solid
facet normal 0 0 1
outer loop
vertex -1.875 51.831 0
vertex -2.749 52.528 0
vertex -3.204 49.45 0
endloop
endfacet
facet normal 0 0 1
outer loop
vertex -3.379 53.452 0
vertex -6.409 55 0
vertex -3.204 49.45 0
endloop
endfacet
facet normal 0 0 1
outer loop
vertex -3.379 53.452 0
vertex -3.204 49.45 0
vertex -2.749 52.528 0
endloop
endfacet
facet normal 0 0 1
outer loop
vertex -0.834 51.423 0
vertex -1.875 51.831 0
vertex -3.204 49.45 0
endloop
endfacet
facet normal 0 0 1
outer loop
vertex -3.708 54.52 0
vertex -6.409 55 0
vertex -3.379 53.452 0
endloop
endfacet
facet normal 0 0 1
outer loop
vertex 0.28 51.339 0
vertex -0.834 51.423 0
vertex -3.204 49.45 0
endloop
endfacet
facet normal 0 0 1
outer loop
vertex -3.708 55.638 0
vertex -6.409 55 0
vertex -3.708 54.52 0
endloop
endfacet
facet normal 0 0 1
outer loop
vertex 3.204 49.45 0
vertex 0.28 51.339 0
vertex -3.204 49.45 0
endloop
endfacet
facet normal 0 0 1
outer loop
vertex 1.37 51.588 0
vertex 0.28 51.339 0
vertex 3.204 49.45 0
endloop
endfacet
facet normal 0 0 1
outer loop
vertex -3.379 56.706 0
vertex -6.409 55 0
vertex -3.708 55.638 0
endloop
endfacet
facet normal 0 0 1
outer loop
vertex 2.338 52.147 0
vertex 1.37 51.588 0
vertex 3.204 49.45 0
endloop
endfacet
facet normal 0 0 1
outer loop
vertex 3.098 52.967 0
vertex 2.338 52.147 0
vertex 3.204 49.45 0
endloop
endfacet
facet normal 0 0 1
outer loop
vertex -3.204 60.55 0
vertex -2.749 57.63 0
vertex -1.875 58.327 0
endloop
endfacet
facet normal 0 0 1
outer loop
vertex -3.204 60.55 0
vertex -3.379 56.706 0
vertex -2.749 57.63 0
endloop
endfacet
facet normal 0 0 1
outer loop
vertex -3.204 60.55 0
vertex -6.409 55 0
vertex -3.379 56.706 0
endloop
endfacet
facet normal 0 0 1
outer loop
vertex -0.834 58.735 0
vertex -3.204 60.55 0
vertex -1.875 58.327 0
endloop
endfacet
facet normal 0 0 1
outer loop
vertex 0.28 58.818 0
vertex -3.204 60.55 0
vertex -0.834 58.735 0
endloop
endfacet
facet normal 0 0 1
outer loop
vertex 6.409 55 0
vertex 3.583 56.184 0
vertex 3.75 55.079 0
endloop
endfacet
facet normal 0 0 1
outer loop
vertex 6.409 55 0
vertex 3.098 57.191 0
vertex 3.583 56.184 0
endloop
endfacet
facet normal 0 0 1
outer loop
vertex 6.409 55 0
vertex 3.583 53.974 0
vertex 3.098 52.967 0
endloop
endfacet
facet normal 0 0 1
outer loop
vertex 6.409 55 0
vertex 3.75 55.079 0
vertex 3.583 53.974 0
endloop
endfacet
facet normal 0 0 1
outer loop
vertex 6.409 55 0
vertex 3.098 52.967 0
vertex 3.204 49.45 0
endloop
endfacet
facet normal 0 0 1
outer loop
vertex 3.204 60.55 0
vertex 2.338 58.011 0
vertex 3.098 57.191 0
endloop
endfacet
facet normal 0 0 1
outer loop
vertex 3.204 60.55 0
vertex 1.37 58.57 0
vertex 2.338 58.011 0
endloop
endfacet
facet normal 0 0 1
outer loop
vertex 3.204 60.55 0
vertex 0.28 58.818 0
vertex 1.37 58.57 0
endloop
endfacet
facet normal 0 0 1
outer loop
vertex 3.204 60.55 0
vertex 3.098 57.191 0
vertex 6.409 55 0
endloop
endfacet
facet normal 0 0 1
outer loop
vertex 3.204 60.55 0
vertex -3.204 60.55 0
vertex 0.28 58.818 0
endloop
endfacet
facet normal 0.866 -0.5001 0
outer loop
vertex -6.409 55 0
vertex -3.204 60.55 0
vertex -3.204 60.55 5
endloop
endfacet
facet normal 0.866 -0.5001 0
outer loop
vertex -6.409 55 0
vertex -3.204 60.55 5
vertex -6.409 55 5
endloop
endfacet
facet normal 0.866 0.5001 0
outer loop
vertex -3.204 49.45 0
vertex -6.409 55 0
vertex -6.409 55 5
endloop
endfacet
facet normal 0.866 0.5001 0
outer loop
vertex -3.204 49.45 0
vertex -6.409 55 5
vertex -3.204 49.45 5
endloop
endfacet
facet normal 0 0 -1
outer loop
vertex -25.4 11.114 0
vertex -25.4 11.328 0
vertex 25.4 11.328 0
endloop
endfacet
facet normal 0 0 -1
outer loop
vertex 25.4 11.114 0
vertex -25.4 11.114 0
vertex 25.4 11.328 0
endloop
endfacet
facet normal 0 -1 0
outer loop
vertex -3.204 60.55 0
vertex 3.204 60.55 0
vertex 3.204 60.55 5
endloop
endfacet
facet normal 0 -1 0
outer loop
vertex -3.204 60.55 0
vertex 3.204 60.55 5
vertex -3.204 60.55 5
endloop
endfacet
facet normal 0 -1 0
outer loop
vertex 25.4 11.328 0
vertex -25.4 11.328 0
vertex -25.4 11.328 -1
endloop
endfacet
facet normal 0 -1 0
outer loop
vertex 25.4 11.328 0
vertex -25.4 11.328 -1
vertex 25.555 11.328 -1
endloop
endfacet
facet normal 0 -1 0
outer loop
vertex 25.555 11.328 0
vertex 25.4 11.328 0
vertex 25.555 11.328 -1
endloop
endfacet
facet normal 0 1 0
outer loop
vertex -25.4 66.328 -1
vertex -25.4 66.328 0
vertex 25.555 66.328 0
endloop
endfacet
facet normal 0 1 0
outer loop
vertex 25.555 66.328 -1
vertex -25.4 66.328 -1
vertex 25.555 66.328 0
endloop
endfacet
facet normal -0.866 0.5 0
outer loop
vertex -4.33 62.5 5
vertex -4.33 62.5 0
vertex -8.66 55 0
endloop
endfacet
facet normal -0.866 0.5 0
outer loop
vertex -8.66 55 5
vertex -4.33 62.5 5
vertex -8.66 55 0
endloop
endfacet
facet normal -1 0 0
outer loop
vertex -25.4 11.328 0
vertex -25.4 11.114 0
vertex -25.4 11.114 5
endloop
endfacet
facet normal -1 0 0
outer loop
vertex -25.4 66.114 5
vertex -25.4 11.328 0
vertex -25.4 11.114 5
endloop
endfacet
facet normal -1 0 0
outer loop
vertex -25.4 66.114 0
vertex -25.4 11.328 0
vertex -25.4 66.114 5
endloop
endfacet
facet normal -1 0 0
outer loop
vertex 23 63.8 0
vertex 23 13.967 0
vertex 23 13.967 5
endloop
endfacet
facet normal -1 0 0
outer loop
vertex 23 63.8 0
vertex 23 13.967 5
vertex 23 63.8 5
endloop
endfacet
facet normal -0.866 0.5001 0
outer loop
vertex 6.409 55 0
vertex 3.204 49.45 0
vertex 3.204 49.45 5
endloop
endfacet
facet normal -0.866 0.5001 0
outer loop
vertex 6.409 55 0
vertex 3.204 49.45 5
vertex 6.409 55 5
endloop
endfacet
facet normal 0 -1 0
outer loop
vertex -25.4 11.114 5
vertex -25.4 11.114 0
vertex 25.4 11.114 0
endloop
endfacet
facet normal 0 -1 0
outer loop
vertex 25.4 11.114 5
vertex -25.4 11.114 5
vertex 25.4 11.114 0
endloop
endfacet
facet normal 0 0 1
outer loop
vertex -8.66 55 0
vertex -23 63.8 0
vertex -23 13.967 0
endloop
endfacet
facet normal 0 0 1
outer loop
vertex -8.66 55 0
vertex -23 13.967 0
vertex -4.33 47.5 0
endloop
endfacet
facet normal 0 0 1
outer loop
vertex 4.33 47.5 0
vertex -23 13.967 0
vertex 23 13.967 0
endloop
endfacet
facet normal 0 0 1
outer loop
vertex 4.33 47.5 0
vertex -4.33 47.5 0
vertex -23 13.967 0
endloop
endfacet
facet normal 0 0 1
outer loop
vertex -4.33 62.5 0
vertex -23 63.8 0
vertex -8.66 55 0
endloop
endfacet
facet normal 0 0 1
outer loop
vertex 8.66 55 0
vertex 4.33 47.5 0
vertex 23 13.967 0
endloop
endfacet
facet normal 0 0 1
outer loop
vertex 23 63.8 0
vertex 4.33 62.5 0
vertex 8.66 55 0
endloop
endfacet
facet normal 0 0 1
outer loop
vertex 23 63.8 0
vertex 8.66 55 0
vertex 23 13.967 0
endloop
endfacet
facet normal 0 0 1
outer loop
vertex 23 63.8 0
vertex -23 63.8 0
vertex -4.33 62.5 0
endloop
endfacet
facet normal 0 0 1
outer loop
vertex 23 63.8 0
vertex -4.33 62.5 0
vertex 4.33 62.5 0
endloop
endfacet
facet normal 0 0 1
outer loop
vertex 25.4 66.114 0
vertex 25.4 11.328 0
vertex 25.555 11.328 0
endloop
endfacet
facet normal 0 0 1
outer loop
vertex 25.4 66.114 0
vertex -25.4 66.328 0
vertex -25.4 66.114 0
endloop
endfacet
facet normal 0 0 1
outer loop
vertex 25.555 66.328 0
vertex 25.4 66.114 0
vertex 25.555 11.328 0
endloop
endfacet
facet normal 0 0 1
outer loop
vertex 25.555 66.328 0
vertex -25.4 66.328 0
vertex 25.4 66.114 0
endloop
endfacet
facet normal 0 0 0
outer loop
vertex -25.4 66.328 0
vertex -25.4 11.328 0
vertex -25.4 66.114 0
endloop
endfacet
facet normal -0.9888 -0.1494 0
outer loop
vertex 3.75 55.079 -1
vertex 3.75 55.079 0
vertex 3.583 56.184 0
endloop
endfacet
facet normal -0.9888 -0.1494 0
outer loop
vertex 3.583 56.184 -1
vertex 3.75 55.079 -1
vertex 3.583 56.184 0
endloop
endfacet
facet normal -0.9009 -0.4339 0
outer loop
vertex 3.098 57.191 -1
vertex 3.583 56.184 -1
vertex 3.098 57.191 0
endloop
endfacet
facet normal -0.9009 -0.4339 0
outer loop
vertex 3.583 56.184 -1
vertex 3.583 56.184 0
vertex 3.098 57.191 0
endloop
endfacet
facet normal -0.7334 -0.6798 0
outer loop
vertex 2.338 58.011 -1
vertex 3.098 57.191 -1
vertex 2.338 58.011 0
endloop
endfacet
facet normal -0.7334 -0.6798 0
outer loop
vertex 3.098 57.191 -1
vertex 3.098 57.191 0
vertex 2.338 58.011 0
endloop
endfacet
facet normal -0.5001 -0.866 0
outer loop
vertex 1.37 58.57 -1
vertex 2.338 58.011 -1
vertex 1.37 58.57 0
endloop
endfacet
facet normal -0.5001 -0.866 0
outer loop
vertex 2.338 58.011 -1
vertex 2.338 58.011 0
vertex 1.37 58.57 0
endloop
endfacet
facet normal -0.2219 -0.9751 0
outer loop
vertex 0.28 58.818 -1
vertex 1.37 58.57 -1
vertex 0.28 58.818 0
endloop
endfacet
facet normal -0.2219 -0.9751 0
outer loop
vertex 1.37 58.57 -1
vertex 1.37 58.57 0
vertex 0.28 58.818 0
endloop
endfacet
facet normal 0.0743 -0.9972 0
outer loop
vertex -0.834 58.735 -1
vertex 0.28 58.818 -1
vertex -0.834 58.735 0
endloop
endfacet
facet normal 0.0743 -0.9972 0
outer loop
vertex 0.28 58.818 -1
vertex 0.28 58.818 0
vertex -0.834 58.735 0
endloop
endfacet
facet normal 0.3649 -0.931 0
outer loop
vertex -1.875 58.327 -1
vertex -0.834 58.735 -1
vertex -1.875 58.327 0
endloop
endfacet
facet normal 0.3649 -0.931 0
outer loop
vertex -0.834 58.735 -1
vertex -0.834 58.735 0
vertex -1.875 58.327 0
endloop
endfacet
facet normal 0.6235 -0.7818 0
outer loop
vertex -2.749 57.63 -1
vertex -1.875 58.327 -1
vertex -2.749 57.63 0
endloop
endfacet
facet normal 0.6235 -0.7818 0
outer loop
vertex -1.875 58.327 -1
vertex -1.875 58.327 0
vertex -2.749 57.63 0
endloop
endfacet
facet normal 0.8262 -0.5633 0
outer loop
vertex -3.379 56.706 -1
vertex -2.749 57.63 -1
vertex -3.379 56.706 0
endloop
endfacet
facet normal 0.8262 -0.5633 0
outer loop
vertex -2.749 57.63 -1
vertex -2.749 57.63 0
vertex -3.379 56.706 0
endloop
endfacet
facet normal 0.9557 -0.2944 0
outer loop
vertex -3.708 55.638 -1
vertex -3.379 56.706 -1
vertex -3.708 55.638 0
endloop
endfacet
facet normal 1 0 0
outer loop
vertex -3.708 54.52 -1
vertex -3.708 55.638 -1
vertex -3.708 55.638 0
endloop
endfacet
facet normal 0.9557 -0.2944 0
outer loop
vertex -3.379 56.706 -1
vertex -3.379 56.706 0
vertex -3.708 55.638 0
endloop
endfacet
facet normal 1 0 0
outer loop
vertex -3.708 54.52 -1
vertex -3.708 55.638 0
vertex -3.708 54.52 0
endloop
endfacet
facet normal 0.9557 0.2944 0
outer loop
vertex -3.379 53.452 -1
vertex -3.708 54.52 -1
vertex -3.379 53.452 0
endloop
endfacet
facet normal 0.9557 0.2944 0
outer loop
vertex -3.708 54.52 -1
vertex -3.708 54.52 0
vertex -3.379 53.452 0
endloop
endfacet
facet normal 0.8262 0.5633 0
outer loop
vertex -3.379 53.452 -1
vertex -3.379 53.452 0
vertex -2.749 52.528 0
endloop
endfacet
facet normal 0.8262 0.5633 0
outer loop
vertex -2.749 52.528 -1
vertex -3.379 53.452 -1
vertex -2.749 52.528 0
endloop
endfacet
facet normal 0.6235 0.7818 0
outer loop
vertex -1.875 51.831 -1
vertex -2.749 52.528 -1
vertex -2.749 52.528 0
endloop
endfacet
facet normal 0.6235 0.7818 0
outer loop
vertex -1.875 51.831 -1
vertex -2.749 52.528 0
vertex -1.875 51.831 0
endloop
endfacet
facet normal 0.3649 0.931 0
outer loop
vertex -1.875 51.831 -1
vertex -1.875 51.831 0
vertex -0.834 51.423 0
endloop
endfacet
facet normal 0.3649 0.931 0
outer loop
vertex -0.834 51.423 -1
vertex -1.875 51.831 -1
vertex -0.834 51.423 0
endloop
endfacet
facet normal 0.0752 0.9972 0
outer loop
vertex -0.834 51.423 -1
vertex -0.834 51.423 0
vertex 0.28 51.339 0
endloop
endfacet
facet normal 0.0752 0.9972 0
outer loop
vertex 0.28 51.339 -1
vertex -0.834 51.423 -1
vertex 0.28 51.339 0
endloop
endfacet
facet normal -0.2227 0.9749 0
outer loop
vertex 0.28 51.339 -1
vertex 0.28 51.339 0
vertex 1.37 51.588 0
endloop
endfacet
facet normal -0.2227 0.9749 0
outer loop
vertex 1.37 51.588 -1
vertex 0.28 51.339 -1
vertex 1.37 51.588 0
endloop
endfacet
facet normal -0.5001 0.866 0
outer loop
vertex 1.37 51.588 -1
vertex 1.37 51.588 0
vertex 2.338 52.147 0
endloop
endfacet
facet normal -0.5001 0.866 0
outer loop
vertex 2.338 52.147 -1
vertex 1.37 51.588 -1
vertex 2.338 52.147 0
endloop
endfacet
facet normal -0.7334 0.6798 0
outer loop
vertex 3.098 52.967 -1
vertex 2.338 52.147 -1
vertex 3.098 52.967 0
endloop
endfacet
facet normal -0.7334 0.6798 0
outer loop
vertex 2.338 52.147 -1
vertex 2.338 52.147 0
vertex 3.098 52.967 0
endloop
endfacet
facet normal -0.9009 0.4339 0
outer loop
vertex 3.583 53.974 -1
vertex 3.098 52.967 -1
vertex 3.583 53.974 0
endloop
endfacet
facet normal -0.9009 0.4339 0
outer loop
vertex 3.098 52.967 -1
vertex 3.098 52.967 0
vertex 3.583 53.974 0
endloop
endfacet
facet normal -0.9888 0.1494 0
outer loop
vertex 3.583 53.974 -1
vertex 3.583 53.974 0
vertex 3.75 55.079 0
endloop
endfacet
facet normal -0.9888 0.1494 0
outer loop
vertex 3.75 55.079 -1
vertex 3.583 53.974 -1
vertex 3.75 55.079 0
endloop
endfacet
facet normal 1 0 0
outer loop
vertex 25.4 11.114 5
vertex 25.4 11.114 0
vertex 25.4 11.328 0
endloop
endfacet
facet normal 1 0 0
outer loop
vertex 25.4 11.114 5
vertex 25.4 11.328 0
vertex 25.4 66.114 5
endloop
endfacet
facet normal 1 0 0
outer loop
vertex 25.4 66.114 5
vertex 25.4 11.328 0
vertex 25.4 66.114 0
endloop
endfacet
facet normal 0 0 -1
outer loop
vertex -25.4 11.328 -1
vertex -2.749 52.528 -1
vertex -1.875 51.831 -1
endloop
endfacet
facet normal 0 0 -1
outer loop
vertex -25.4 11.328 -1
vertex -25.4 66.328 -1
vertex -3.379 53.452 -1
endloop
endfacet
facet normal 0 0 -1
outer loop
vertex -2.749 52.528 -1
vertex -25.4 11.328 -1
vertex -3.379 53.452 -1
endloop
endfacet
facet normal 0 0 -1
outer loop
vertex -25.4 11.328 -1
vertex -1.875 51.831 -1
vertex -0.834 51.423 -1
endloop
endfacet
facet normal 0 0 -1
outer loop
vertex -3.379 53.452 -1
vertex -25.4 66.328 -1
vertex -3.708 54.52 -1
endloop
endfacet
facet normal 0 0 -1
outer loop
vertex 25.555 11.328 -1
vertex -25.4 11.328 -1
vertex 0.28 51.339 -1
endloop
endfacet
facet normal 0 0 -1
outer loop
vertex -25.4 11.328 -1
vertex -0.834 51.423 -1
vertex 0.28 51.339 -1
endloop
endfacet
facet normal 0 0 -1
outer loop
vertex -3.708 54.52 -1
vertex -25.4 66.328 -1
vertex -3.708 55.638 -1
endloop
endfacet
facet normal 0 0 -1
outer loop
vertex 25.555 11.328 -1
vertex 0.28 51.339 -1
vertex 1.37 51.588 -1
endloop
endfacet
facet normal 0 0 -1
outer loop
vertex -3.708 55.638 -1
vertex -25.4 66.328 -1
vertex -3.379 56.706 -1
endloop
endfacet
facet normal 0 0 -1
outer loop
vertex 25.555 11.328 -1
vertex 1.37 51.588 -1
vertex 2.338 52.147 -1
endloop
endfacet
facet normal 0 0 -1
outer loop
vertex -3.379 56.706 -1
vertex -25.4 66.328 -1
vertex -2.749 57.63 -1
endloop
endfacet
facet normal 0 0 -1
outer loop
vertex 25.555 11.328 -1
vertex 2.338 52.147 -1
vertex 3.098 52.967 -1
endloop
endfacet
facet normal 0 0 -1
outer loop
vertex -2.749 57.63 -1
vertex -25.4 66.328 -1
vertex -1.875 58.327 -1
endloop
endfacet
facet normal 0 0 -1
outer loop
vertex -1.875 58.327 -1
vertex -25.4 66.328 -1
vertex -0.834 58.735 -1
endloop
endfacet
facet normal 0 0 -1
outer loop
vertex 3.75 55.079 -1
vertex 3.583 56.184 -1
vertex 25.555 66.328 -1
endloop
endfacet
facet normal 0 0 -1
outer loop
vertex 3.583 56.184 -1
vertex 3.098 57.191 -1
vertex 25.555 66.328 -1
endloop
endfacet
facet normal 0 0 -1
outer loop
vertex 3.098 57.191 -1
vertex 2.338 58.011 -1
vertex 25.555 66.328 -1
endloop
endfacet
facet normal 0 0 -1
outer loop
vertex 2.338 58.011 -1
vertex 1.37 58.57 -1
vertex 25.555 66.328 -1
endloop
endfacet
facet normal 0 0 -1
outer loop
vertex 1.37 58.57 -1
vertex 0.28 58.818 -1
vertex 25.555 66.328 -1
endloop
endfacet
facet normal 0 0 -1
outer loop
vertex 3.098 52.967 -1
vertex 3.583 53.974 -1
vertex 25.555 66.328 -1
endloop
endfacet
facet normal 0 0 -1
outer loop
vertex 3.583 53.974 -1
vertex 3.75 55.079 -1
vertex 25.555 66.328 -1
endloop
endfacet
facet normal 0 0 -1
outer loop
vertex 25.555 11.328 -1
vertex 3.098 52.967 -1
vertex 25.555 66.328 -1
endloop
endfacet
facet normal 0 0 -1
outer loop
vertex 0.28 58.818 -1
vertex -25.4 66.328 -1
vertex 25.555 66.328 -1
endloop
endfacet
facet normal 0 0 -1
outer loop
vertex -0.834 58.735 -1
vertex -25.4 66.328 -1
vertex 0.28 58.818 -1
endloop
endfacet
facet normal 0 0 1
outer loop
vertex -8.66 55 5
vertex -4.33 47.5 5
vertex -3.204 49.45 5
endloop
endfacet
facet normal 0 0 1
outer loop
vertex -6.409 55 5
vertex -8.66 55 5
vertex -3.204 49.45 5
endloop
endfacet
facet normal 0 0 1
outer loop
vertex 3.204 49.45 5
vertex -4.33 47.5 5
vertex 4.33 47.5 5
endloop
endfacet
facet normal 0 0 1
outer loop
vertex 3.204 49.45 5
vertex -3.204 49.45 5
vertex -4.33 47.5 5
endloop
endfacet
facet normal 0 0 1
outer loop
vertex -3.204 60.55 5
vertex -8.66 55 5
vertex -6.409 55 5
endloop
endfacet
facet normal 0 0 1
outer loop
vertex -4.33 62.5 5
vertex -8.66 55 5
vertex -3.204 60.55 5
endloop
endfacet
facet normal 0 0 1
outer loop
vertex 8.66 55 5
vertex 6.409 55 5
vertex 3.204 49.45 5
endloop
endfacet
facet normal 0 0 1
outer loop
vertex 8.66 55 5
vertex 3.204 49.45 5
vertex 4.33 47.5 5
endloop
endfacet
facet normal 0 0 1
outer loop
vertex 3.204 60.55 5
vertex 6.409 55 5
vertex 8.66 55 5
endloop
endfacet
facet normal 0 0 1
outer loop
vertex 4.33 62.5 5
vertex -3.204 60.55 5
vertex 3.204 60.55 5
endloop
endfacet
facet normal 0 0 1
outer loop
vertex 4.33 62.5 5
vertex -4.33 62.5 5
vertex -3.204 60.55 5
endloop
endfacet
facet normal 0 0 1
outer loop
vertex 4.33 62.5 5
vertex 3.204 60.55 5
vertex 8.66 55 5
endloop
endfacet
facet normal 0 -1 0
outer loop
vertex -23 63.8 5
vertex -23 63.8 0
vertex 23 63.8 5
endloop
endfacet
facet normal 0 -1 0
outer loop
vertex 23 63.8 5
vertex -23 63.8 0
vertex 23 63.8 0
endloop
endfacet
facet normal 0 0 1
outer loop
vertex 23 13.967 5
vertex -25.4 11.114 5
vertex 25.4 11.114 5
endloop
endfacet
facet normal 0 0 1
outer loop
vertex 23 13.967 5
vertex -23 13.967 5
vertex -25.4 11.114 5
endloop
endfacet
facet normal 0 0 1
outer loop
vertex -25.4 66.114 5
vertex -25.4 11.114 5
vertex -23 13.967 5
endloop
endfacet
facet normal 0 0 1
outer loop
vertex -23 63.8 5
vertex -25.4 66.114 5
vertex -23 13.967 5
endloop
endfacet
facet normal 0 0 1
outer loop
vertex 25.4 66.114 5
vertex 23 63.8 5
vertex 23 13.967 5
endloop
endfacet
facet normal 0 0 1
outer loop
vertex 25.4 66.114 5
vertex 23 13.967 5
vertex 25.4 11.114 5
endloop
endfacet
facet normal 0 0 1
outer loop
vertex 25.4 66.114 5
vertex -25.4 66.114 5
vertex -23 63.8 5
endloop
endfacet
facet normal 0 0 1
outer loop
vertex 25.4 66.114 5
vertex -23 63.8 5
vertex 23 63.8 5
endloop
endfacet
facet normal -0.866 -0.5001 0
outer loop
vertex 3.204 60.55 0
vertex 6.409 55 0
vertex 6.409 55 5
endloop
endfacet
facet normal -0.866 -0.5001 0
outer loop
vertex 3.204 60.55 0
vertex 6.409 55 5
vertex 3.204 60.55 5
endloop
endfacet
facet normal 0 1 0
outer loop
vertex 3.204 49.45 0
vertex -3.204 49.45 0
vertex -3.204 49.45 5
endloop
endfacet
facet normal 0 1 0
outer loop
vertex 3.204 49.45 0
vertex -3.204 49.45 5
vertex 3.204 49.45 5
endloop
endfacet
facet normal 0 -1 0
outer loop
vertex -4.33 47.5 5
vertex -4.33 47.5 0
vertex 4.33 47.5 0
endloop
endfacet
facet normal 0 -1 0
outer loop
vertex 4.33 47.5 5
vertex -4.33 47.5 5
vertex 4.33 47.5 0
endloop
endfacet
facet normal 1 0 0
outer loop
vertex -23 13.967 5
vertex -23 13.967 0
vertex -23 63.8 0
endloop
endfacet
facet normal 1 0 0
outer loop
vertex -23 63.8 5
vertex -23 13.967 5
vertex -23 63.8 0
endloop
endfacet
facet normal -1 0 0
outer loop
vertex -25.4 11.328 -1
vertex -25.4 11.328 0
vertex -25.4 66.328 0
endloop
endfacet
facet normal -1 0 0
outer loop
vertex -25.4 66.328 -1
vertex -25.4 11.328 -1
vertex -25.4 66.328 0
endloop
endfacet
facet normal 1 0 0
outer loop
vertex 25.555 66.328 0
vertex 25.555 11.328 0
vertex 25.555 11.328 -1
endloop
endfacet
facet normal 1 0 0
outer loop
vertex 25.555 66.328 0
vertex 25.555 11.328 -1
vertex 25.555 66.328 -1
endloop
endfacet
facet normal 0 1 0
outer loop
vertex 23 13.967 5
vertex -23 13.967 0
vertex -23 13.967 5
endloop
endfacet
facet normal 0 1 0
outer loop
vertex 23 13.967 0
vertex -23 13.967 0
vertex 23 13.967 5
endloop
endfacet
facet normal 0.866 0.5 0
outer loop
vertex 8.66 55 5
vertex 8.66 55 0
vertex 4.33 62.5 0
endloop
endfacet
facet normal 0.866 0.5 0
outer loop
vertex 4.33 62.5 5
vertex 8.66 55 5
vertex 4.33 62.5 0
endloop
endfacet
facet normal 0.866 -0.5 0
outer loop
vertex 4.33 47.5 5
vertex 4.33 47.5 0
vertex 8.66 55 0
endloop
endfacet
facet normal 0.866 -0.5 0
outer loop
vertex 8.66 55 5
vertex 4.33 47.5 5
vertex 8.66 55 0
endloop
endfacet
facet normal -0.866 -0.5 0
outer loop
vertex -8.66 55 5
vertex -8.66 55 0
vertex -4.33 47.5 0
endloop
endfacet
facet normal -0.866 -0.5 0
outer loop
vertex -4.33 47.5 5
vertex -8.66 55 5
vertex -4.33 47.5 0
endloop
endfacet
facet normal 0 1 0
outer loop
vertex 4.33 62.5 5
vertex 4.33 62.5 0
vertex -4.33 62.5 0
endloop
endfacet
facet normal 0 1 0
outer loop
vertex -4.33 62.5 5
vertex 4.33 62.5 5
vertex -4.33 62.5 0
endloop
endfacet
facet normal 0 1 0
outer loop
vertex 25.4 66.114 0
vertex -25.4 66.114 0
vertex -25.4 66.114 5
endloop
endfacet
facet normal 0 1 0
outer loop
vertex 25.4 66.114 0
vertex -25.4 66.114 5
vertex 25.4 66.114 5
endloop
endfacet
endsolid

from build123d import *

# Parameters (mm, degrees)
PAD005_DEPTH  = 5
SKETCH007_W   = 50.955005
SKETCH007_H   = 55
SKETCH007_R   = 3.75
PAD006_DEPTH  = 1
SKETCH008_W   = 50.8
SKETCH008_H   = 55
SKETCH008_W_2 = 46
SKETCH008_H_2 = 49.832681
PAD007_DEPTH  = 5


with BuildPart() as part:
    # Sketch006 → Pad005 (new body)
    with BuildSketch(Plane.XY):
        Polygon((4.330127, 47.5), (8.660254, 55), (4.330127, 62.5), (-4.330127, 62.5), (-8.660254, 55), (-4.330127, 47.5), align=None)
        Polygon((3.204294, 49.45), (6.408588, 55), (3.204294, 60.55), (-3.204294, 60.55), (-6.408588, 55), (-3.204294, 49.45), align=None, mode=Mode.SUBTRACT)
    extrude(amount=PAD005_DEPTH)

    # Sketch007 → Pad006 (join)
    with BuildSketch(Plane.XY):
        with Locations((0.077502, 38.828427)):
            Rectangle(SKETCH007_W, SKETCH007_H)
        with Locations((0, 55.078962)):
            Circle(SKETCH007_R, mode=Mode.SUBTRACT)
    extrude(amount=-PAD006_DEPTH)

    # Sketch008 → Pad007 (join)
    with BuildSketch(Plane.XY):
        with Locations((0, 38.613518)):
            Rectangle(SKETCH008_W, SKETCH008_H)
        with Locations((0, 38.883774)):
            Rectangle(SKETCH008_W_2, SKETCH008_H_2, mode=Mode.SUBTRACT)
    extrude(amount=PAD007_DEPTH)


solid = part.part
